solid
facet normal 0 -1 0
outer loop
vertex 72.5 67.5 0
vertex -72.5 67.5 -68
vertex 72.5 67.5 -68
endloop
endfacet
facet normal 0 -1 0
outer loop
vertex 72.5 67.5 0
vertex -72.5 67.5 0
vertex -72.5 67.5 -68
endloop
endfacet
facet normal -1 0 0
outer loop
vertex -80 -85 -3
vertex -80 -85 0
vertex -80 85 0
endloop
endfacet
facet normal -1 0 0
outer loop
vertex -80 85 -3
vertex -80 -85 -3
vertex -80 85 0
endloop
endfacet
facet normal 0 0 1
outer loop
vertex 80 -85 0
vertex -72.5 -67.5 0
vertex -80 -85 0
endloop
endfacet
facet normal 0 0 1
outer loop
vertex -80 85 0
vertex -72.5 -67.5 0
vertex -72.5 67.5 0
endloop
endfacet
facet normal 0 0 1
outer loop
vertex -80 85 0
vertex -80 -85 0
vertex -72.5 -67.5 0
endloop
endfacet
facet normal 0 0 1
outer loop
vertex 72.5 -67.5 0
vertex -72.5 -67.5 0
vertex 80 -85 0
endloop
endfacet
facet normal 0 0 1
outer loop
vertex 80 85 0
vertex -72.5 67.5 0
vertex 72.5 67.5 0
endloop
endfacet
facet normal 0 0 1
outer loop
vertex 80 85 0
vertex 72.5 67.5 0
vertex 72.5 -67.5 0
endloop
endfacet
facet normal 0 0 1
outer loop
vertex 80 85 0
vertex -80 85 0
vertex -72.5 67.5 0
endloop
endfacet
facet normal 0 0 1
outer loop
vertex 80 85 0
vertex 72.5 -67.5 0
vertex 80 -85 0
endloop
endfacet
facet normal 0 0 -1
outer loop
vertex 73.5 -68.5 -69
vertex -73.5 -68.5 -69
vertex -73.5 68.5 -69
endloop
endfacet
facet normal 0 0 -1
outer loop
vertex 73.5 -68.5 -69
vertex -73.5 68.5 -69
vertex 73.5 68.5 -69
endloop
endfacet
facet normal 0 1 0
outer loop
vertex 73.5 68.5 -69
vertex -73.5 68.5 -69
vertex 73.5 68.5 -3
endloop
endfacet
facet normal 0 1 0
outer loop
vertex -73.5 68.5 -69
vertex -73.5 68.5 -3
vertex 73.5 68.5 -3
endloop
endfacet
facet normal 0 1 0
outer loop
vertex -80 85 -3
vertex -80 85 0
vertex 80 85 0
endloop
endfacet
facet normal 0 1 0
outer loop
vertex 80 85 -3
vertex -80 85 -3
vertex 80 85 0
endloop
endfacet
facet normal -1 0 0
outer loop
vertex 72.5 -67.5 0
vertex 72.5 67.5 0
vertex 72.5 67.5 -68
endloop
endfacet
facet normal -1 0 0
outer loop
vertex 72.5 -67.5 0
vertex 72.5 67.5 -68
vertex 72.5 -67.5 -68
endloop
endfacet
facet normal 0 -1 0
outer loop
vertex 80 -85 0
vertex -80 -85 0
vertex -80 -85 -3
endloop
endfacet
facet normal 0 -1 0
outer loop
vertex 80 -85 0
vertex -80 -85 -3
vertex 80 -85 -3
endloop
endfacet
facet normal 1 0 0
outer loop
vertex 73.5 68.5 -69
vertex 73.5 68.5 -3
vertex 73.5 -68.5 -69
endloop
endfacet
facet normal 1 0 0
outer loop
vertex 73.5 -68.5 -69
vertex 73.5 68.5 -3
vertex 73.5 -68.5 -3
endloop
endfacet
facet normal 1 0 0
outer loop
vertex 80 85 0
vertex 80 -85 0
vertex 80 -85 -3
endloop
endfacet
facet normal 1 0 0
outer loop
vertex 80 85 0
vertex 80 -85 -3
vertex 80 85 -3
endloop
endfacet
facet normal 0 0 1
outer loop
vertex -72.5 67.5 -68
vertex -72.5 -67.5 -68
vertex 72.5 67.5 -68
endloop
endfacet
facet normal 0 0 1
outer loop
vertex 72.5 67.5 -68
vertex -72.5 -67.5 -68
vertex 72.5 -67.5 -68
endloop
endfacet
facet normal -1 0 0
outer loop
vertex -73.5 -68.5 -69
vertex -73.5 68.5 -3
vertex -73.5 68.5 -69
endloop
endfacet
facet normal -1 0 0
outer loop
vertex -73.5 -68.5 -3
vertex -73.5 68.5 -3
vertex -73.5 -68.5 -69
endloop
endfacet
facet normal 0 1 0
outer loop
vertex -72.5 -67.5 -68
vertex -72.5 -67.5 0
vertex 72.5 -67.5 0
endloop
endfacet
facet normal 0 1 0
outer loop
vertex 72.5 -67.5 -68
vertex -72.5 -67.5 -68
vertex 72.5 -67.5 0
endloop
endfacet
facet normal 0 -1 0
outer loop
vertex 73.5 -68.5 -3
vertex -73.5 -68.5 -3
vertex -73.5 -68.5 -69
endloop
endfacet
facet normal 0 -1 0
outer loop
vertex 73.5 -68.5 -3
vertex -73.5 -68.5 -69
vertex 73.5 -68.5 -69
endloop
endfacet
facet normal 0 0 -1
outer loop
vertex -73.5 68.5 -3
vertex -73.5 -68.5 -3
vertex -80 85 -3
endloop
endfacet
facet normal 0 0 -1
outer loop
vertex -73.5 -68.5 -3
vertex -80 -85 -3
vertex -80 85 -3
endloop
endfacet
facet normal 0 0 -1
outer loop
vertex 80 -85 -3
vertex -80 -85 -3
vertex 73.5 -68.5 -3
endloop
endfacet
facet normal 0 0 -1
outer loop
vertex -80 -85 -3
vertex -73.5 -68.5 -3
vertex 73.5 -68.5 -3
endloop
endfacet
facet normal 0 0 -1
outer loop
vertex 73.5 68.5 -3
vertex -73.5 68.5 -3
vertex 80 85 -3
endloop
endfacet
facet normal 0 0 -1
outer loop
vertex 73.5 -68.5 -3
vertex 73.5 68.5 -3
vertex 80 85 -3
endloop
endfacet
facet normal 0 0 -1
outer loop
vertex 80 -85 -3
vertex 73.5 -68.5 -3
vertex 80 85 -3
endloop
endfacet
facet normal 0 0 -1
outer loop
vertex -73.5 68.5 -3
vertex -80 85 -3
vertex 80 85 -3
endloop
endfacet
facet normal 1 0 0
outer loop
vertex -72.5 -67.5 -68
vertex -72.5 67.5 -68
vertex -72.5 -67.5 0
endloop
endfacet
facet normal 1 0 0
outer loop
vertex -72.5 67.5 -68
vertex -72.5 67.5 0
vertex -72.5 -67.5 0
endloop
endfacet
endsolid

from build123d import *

# Parameters (mm, degrees)
F0_W     = 160
F0_H     = 170
F0_W_2   = 145
F0_H_2   = 135
F1_DEPTH = 3
F2_W     = 147
F2_H     = 137
F2_W_2   = 145
F2_H_2   = 135
F3_DEPTH = 65
F4_W     = 147
F4_H     = 137
F5_DEPTH = 1


with BuildPart() as f1:
    # F0 (on Top) → F1 (new body)
    with BuildSketch(Plane.XY):
        Rectangle(F0_W, F0_H)
        Rectangle(F0_W_2, F0_H_2, mode=Mode.SUBTRACT)
    extrude(amount=-F1_DEPTH)

    # F2 (on face) → F3 (join)
    with BuildSketch(Plane(origin=(0, 0, -3), x_dir=(1, 0, 0), z_dir=(0, 0, -1))):
        Rectangle(F2_W, F2_H)
        Rectangle(F2_W_2, F2_H_2, mode=Mode.SUBTRACT)
    extrude(amount=F3_DEPTH)

    # F4 (on face) → F5 (join)
    with BuildSketch(Plane(origin=(0, 0, -68), x_dir=(1, 0, 0), z_dir=(0, 0, -1))):
        Rectangle(F4_W, F4_H)
    extrude(amount=F5_DEPTH)


solid = f1.part
